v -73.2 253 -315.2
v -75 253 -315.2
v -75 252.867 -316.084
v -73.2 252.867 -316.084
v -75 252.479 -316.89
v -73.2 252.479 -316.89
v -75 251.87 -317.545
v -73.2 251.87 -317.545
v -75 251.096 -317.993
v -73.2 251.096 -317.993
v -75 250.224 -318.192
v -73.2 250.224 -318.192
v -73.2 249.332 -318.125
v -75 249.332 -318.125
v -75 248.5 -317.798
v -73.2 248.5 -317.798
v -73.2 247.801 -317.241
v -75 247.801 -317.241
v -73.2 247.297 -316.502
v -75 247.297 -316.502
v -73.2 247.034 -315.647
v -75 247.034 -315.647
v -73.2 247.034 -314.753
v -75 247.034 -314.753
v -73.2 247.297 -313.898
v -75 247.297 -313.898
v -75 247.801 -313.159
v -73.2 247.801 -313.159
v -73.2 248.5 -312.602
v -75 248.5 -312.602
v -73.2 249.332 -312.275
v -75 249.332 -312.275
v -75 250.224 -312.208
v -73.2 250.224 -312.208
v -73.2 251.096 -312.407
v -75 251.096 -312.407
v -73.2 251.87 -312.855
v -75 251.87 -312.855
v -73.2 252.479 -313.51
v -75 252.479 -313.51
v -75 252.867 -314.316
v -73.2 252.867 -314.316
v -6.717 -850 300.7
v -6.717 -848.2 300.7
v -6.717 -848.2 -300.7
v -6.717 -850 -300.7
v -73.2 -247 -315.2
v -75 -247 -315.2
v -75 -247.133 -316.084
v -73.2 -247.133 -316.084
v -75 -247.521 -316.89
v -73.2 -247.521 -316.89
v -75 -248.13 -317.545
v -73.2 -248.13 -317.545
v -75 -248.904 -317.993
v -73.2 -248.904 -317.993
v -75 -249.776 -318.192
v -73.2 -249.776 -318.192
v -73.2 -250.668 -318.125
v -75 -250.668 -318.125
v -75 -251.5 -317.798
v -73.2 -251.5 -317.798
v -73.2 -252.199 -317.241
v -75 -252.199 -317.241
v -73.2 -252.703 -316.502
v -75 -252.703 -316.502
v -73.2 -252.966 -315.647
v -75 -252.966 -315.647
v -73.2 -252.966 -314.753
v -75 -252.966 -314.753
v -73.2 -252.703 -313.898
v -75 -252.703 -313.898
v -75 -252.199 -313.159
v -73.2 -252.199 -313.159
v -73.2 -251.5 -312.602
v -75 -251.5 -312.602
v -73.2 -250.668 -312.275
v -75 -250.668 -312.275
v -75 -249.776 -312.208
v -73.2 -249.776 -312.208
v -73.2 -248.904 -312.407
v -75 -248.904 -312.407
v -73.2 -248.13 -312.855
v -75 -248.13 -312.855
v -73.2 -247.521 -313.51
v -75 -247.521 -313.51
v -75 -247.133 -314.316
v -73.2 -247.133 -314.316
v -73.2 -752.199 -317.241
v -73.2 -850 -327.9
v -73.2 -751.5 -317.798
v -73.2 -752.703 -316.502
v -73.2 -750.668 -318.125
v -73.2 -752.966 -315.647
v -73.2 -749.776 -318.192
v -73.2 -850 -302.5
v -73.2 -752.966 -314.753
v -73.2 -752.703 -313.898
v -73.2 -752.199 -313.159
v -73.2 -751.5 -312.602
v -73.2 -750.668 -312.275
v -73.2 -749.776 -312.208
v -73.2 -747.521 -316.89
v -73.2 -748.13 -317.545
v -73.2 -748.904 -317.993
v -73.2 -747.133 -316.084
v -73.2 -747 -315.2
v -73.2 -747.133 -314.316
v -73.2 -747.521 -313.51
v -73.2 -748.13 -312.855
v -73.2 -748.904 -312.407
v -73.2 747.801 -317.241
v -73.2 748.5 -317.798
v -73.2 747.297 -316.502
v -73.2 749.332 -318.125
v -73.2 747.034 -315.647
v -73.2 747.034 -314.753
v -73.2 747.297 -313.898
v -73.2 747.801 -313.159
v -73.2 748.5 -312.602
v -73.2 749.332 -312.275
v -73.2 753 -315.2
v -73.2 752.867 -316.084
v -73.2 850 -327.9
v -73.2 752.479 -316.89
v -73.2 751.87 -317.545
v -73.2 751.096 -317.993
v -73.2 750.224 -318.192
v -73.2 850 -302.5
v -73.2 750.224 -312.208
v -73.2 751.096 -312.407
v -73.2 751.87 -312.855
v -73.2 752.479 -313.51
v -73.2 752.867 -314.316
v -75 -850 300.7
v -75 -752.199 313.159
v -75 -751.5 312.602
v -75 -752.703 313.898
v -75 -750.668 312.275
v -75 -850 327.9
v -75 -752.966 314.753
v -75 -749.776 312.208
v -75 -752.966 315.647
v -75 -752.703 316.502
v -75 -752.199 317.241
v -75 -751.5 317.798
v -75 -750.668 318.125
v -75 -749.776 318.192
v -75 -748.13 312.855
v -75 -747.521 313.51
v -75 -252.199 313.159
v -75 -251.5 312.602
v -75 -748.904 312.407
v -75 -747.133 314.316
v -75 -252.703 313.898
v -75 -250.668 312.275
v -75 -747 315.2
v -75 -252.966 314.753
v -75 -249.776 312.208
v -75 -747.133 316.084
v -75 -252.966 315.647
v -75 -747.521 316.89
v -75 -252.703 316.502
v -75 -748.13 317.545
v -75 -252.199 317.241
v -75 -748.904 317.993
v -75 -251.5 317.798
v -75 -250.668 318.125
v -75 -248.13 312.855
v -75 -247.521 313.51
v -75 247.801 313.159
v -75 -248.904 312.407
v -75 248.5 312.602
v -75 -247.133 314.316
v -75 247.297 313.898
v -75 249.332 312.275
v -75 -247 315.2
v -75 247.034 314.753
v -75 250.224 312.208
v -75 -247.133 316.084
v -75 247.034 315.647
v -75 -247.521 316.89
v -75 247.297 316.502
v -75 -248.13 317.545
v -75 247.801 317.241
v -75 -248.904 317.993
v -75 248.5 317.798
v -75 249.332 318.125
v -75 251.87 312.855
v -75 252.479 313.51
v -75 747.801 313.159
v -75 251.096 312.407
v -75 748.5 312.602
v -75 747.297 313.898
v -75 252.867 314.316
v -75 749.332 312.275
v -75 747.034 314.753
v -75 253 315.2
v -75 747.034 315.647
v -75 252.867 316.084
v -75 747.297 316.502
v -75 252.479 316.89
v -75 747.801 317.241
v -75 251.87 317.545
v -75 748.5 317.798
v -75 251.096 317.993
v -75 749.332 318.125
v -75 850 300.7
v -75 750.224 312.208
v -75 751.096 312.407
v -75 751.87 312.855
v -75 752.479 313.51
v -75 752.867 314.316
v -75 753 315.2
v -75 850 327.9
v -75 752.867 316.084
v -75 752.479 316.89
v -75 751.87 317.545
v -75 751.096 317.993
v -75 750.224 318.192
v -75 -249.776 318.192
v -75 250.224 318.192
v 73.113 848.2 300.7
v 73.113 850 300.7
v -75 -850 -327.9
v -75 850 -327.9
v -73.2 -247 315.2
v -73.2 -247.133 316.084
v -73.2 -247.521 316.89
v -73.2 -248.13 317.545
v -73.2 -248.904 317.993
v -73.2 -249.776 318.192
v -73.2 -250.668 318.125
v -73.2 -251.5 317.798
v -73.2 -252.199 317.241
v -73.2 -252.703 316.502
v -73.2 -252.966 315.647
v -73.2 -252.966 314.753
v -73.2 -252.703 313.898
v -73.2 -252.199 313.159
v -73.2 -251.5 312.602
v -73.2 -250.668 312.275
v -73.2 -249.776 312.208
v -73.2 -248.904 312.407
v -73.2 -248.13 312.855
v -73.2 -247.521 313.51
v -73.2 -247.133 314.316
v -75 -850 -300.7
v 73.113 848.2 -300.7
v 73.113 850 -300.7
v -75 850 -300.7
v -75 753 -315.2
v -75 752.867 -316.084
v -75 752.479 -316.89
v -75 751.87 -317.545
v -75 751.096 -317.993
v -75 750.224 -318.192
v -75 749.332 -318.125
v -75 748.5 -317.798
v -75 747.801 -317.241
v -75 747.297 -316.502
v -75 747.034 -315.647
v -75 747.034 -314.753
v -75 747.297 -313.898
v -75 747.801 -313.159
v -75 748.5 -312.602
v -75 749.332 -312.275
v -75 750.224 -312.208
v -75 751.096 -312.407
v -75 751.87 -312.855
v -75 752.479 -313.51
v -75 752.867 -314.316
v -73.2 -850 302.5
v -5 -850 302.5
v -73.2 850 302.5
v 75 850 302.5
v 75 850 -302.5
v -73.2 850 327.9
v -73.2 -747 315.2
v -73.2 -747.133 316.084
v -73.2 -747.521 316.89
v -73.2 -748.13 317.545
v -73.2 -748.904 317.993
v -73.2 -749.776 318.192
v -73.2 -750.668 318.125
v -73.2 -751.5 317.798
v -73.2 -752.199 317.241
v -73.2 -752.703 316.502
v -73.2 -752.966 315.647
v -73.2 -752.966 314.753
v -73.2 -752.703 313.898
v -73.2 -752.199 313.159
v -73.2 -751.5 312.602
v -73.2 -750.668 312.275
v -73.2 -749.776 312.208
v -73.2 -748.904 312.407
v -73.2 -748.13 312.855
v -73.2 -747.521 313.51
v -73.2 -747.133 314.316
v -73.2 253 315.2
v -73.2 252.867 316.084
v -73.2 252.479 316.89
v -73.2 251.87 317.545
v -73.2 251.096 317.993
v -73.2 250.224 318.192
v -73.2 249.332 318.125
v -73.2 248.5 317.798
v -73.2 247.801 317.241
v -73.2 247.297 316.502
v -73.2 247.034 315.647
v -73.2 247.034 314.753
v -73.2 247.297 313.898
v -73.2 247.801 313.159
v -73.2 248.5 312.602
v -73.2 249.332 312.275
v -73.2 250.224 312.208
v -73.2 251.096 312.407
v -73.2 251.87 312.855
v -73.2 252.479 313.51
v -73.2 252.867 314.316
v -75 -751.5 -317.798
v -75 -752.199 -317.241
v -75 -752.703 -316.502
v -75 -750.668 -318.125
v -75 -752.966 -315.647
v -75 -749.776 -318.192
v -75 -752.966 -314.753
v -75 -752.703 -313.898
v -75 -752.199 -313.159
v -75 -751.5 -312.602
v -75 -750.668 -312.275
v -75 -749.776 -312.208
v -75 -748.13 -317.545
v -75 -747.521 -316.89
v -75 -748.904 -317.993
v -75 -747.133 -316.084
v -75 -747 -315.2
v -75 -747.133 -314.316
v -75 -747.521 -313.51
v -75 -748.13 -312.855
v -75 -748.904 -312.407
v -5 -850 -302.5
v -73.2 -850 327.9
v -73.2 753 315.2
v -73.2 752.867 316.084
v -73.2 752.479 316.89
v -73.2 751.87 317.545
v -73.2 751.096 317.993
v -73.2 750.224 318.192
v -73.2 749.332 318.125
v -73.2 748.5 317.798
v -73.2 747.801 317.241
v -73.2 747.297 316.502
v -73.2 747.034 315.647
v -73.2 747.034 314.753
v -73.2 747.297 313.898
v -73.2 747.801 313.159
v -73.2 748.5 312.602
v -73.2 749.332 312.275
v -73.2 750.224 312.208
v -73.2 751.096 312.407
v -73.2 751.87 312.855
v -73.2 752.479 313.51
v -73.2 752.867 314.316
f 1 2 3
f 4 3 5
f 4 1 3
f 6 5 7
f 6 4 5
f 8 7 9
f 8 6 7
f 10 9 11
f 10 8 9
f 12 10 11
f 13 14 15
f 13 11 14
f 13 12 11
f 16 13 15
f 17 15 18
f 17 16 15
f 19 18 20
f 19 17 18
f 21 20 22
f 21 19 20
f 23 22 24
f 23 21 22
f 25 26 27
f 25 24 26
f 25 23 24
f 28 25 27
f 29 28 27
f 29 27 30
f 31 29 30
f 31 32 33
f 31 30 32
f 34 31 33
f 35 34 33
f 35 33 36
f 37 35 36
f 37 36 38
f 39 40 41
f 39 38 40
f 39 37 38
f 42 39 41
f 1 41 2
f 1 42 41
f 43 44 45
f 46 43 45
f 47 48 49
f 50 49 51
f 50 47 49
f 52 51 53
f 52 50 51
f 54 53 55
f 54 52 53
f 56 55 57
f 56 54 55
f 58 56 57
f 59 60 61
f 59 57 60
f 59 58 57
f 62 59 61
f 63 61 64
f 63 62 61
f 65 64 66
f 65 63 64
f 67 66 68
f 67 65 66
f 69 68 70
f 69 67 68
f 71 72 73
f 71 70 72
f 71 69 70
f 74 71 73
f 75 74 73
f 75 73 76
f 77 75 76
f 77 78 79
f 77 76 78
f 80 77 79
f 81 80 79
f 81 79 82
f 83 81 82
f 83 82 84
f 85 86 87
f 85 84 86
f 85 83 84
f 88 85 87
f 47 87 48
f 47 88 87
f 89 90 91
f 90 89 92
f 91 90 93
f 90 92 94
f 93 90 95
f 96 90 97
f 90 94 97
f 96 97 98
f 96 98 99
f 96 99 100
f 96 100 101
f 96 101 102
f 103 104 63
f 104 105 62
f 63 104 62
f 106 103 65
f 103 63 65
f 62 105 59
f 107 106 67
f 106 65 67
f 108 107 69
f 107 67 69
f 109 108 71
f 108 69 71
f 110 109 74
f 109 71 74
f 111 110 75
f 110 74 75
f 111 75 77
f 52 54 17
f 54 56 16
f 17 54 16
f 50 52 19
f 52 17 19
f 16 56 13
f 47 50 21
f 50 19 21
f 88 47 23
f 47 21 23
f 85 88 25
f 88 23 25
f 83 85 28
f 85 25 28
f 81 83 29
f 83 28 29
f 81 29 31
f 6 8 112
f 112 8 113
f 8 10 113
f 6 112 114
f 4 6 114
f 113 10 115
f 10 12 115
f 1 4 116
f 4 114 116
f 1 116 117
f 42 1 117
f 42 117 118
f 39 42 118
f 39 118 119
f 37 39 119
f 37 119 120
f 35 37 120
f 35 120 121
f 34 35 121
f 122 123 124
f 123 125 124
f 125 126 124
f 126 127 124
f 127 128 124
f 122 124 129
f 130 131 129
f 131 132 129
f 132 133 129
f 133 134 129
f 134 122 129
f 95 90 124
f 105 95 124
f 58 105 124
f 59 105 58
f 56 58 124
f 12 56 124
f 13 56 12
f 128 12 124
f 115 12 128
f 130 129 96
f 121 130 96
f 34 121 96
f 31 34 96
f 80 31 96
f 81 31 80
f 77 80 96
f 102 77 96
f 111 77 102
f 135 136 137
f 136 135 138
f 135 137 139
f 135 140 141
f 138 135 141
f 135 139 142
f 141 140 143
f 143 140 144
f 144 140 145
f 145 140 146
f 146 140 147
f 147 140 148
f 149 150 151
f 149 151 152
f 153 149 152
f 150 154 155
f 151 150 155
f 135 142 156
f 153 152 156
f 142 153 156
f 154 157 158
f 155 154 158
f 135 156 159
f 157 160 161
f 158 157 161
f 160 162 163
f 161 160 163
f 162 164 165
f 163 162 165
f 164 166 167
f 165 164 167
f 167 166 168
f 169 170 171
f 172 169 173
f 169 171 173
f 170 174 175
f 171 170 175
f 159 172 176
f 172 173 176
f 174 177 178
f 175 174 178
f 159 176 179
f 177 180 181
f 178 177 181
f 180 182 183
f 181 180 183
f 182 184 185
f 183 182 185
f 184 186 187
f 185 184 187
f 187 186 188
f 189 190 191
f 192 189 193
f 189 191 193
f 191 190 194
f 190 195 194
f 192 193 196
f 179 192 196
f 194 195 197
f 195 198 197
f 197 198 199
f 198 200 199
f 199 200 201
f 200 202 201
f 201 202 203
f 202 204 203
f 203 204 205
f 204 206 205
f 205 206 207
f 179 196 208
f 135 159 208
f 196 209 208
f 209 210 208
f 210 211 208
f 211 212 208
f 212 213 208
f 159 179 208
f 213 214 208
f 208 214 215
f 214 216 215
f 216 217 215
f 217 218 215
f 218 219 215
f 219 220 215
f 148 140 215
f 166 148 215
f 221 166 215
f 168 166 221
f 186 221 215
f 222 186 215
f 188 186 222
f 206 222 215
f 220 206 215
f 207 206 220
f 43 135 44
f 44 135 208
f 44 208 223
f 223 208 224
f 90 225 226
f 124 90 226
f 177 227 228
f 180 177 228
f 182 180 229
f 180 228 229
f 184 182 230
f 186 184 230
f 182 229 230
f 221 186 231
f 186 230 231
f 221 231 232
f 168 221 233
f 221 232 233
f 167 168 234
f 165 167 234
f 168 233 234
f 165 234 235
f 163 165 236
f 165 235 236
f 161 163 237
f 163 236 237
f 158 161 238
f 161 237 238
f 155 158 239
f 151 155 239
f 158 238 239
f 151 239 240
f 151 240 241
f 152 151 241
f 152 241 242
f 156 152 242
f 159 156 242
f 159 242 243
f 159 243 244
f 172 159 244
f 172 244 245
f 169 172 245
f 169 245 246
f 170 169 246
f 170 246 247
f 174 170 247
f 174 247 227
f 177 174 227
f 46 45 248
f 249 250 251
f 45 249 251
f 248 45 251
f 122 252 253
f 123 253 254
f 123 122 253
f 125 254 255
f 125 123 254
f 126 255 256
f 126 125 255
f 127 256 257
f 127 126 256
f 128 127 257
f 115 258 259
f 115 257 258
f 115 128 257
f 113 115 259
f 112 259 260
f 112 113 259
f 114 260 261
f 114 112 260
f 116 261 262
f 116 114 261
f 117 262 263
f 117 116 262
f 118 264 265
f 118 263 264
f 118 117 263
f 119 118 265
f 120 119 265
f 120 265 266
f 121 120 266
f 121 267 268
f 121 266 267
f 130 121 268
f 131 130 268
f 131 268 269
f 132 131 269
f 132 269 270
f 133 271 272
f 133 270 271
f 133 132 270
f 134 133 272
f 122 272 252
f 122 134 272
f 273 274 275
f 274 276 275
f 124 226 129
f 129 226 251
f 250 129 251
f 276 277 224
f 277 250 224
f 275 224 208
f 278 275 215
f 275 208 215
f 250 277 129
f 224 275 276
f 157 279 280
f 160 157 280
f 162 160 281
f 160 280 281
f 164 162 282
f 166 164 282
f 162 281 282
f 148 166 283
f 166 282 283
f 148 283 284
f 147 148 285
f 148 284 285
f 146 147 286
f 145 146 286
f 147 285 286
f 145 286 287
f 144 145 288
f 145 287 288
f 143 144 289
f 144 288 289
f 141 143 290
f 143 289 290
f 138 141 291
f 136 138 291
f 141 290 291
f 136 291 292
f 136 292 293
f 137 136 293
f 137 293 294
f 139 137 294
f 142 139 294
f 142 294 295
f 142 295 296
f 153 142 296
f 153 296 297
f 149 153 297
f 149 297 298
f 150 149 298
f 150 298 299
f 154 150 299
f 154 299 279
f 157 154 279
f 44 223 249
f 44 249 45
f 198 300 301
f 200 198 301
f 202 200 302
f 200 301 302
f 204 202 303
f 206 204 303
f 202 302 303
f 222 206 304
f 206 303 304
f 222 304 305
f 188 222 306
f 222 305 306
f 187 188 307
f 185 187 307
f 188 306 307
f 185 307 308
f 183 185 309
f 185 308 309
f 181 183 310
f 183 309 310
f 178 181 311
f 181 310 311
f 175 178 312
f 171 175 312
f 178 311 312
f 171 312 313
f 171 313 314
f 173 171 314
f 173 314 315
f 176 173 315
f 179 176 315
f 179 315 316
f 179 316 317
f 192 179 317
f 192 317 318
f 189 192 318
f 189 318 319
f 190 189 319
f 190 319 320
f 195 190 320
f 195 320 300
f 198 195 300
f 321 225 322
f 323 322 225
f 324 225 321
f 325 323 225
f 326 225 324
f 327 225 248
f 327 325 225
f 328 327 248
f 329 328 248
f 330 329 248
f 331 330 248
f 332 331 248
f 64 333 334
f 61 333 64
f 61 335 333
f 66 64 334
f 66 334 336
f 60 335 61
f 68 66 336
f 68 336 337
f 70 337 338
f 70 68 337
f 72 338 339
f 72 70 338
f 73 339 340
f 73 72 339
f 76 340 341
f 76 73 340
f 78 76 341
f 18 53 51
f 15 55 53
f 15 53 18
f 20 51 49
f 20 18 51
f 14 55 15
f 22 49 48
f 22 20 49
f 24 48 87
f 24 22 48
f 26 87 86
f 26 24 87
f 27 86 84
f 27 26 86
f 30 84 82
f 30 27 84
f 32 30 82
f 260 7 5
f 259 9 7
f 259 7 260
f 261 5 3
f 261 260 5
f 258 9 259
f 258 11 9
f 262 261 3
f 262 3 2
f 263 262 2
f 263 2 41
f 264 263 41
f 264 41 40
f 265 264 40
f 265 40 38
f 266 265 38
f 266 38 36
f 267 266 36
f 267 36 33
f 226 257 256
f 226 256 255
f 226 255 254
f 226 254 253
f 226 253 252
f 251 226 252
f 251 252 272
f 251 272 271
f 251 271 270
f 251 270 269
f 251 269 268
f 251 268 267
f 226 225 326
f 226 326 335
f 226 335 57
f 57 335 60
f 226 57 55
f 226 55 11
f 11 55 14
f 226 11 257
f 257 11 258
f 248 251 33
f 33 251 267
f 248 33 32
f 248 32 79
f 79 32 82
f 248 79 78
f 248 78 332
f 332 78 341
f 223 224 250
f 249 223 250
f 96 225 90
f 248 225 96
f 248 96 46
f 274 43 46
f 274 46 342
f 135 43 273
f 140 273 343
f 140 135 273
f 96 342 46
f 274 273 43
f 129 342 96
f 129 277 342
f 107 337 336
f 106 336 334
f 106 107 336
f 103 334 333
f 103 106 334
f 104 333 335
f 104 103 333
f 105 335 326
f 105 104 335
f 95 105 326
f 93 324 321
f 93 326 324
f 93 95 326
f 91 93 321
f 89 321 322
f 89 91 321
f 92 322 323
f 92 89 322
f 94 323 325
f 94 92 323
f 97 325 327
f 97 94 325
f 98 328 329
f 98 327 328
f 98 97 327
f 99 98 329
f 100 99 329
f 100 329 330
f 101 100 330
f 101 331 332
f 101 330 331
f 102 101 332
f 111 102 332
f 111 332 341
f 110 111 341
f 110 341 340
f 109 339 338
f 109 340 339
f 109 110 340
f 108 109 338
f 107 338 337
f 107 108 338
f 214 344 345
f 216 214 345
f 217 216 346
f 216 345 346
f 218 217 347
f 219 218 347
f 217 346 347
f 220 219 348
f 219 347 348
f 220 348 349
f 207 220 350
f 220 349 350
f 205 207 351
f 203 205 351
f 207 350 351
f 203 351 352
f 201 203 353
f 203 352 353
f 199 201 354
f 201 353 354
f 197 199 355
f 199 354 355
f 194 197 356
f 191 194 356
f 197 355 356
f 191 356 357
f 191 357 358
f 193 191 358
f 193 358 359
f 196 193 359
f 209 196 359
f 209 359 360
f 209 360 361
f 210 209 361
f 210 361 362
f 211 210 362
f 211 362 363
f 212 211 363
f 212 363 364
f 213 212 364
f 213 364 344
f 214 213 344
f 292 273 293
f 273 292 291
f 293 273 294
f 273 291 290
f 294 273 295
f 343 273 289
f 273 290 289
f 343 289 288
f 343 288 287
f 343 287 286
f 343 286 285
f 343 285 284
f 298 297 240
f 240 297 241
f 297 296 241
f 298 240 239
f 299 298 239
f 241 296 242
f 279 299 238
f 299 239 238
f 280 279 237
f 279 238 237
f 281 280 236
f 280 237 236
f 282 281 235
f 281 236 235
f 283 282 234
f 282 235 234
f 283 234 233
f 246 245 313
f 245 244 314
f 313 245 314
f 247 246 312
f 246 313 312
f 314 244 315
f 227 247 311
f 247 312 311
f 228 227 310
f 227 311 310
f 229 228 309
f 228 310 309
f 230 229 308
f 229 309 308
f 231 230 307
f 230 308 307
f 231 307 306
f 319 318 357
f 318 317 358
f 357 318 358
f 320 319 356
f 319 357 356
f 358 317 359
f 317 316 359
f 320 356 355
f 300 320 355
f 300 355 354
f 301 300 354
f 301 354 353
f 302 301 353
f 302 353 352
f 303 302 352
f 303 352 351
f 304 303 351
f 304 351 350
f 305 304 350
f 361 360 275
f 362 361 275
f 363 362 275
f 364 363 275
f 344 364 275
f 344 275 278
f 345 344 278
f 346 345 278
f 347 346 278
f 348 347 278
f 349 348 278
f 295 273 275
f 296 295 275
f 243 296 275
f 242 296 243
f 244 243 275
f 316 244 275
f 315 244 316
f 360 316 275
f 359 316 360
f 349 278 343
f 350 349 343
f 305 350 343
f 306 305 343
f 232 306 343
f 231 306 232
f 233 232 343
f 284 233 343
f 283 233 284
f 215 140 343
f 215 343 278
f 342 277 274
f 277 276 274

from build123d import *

# Parameters (mm, degrees)
BOSS_EXTRUDE1_DEPTH = 302.5
SHELL1_T            = -1.8
CUT_EXTRUDE4_REACH  = 1730.332
SKETCH22_W          = 148.11330214
SKETCH22_H          = 601.4
CUT_EXTRUDE5_REACH  = 1728.561
SKETCH23_W          = 68.282713905
SKETCH23_H          = 601.4
SKETCH24_W          = 25.4
SKETCH24_H          = 1700
BOSS_EXTRUDE2_DEPTH = 1.8
SKETCH25_R          = 3
CUT_EXTRUDE6_DEPTH  = 10


with BuildPart() as part:
    # Sketch21 → Boss-Extrude1 (new, symmetric)
    with BuildSketch(Plane.XY):
        Polygon((-75, -850), (-75, 850), (75, 850), (-5, -850), align=None)
    extrude(amount=BOSS_EXTRUDE1_DEPTH, both=True)

    # Shell1
    shell1_openings = [part.faces().sort_by_distance(p)[0] for p in [
        (-75, 0, 0),
    ]]
    offset(amount=SHELL1_T, openings=shell1_openings, kind=Kind.INTERSECTION)

    # Sketch22 → Cut-Extrude4 (cut, up to next)
    with BuildSketch(Plane(origin=(0, 850, 0), x_dir=(1, 0, 0), z_dir=(0, 1, 0)), mode=Mode.PRIVATE) as cut_extrude4_sk1:
        with Locations((-0.94334893, 0)):
            Rectangle(SKETCH22_W, SKETCH22_H)
    cut_extrude4_tool1 = extrude(cut_extrude4_sk1.sketch, amount=-CUT_EXTRUDE4_REACH, mode=Mode.PRIVATE) & part.part
    add(cut_extrude4_tool1.solids().sort_by_distance((-0.943349, 850, 0))[0], mode=Mode.SUBTRACT)

    # Sketch23 → Cut-Extrude5 (cut, up to next)
    with BuildSketch(Plane(origin=(0, -848.2, 0), x_dir=(1, 0, 0), z_dir=(0, 1, 0)), mode=Mode.PRIVATE) as cut_extrude5_sk1:
        with Locations((-40.858643048, 0)):
            Rectangle(SKETCH23_W, SKETCH23_H)
    cut_extrude5_tool1 = extrude(cut_extrude5_sk1.sketch, amount=-CUT_EXTRUDE5_REACH, mode=Mode.PRIVATE) & part.part
    add(cut_extrude5_tool1.solids().sort_by_distance((-40.858643, -848.2, 0))[0], mode=Mode.SUBTRACT)

    # Sketch24 → Boss-Extrude2 (add)
    with BuildSketch(Plane.ZY.offset(75)):
        with Locations((-315.2, 0)):
            Rectangle(SKETCH24_W, SKETCH24_H)
        with Locations((315.2, 0)):
            Rectangle(SKETCH24_W, SKETCH24_H)
    extrude(amount=-BOSS_EXTRUDE2_DEPTH)

    # Sketch25 → Cut-Extrude6 (cut)
    with BuildSketch(Plane(origin=(-73.2, 0, 0), x_dir=(0, 0, -1), z_dir=(1, 0, 0))):
        with Locations(Location((-315.2, 750, 0), (0, 0, 90))):
            Circle(SKETCH25_R)
        with Locations(Location((-315.2, 250, 0), (0, 0, 90))):
            Circle(SKETCH25_R)
        with Locations(Location((-315.2, -250, 0), (0, 0, 90))):
            Circle(SKETCH25_R)
        with Locations(Location((-315.2, -750, 0), (0, 0, 90))):
            Circle(SKETCH25_R)
    cut_extrude6 = extrude(amount=-CUT_EXTRUDE6_DEPTH, mode=Mode.SUBTRACT)

    # Mirror1: Cut-Extrude6 across plane
    add(cut_extrude6.mirror(Plane.XY), mode=Mode.SUBTRACT)


solid = part.part
